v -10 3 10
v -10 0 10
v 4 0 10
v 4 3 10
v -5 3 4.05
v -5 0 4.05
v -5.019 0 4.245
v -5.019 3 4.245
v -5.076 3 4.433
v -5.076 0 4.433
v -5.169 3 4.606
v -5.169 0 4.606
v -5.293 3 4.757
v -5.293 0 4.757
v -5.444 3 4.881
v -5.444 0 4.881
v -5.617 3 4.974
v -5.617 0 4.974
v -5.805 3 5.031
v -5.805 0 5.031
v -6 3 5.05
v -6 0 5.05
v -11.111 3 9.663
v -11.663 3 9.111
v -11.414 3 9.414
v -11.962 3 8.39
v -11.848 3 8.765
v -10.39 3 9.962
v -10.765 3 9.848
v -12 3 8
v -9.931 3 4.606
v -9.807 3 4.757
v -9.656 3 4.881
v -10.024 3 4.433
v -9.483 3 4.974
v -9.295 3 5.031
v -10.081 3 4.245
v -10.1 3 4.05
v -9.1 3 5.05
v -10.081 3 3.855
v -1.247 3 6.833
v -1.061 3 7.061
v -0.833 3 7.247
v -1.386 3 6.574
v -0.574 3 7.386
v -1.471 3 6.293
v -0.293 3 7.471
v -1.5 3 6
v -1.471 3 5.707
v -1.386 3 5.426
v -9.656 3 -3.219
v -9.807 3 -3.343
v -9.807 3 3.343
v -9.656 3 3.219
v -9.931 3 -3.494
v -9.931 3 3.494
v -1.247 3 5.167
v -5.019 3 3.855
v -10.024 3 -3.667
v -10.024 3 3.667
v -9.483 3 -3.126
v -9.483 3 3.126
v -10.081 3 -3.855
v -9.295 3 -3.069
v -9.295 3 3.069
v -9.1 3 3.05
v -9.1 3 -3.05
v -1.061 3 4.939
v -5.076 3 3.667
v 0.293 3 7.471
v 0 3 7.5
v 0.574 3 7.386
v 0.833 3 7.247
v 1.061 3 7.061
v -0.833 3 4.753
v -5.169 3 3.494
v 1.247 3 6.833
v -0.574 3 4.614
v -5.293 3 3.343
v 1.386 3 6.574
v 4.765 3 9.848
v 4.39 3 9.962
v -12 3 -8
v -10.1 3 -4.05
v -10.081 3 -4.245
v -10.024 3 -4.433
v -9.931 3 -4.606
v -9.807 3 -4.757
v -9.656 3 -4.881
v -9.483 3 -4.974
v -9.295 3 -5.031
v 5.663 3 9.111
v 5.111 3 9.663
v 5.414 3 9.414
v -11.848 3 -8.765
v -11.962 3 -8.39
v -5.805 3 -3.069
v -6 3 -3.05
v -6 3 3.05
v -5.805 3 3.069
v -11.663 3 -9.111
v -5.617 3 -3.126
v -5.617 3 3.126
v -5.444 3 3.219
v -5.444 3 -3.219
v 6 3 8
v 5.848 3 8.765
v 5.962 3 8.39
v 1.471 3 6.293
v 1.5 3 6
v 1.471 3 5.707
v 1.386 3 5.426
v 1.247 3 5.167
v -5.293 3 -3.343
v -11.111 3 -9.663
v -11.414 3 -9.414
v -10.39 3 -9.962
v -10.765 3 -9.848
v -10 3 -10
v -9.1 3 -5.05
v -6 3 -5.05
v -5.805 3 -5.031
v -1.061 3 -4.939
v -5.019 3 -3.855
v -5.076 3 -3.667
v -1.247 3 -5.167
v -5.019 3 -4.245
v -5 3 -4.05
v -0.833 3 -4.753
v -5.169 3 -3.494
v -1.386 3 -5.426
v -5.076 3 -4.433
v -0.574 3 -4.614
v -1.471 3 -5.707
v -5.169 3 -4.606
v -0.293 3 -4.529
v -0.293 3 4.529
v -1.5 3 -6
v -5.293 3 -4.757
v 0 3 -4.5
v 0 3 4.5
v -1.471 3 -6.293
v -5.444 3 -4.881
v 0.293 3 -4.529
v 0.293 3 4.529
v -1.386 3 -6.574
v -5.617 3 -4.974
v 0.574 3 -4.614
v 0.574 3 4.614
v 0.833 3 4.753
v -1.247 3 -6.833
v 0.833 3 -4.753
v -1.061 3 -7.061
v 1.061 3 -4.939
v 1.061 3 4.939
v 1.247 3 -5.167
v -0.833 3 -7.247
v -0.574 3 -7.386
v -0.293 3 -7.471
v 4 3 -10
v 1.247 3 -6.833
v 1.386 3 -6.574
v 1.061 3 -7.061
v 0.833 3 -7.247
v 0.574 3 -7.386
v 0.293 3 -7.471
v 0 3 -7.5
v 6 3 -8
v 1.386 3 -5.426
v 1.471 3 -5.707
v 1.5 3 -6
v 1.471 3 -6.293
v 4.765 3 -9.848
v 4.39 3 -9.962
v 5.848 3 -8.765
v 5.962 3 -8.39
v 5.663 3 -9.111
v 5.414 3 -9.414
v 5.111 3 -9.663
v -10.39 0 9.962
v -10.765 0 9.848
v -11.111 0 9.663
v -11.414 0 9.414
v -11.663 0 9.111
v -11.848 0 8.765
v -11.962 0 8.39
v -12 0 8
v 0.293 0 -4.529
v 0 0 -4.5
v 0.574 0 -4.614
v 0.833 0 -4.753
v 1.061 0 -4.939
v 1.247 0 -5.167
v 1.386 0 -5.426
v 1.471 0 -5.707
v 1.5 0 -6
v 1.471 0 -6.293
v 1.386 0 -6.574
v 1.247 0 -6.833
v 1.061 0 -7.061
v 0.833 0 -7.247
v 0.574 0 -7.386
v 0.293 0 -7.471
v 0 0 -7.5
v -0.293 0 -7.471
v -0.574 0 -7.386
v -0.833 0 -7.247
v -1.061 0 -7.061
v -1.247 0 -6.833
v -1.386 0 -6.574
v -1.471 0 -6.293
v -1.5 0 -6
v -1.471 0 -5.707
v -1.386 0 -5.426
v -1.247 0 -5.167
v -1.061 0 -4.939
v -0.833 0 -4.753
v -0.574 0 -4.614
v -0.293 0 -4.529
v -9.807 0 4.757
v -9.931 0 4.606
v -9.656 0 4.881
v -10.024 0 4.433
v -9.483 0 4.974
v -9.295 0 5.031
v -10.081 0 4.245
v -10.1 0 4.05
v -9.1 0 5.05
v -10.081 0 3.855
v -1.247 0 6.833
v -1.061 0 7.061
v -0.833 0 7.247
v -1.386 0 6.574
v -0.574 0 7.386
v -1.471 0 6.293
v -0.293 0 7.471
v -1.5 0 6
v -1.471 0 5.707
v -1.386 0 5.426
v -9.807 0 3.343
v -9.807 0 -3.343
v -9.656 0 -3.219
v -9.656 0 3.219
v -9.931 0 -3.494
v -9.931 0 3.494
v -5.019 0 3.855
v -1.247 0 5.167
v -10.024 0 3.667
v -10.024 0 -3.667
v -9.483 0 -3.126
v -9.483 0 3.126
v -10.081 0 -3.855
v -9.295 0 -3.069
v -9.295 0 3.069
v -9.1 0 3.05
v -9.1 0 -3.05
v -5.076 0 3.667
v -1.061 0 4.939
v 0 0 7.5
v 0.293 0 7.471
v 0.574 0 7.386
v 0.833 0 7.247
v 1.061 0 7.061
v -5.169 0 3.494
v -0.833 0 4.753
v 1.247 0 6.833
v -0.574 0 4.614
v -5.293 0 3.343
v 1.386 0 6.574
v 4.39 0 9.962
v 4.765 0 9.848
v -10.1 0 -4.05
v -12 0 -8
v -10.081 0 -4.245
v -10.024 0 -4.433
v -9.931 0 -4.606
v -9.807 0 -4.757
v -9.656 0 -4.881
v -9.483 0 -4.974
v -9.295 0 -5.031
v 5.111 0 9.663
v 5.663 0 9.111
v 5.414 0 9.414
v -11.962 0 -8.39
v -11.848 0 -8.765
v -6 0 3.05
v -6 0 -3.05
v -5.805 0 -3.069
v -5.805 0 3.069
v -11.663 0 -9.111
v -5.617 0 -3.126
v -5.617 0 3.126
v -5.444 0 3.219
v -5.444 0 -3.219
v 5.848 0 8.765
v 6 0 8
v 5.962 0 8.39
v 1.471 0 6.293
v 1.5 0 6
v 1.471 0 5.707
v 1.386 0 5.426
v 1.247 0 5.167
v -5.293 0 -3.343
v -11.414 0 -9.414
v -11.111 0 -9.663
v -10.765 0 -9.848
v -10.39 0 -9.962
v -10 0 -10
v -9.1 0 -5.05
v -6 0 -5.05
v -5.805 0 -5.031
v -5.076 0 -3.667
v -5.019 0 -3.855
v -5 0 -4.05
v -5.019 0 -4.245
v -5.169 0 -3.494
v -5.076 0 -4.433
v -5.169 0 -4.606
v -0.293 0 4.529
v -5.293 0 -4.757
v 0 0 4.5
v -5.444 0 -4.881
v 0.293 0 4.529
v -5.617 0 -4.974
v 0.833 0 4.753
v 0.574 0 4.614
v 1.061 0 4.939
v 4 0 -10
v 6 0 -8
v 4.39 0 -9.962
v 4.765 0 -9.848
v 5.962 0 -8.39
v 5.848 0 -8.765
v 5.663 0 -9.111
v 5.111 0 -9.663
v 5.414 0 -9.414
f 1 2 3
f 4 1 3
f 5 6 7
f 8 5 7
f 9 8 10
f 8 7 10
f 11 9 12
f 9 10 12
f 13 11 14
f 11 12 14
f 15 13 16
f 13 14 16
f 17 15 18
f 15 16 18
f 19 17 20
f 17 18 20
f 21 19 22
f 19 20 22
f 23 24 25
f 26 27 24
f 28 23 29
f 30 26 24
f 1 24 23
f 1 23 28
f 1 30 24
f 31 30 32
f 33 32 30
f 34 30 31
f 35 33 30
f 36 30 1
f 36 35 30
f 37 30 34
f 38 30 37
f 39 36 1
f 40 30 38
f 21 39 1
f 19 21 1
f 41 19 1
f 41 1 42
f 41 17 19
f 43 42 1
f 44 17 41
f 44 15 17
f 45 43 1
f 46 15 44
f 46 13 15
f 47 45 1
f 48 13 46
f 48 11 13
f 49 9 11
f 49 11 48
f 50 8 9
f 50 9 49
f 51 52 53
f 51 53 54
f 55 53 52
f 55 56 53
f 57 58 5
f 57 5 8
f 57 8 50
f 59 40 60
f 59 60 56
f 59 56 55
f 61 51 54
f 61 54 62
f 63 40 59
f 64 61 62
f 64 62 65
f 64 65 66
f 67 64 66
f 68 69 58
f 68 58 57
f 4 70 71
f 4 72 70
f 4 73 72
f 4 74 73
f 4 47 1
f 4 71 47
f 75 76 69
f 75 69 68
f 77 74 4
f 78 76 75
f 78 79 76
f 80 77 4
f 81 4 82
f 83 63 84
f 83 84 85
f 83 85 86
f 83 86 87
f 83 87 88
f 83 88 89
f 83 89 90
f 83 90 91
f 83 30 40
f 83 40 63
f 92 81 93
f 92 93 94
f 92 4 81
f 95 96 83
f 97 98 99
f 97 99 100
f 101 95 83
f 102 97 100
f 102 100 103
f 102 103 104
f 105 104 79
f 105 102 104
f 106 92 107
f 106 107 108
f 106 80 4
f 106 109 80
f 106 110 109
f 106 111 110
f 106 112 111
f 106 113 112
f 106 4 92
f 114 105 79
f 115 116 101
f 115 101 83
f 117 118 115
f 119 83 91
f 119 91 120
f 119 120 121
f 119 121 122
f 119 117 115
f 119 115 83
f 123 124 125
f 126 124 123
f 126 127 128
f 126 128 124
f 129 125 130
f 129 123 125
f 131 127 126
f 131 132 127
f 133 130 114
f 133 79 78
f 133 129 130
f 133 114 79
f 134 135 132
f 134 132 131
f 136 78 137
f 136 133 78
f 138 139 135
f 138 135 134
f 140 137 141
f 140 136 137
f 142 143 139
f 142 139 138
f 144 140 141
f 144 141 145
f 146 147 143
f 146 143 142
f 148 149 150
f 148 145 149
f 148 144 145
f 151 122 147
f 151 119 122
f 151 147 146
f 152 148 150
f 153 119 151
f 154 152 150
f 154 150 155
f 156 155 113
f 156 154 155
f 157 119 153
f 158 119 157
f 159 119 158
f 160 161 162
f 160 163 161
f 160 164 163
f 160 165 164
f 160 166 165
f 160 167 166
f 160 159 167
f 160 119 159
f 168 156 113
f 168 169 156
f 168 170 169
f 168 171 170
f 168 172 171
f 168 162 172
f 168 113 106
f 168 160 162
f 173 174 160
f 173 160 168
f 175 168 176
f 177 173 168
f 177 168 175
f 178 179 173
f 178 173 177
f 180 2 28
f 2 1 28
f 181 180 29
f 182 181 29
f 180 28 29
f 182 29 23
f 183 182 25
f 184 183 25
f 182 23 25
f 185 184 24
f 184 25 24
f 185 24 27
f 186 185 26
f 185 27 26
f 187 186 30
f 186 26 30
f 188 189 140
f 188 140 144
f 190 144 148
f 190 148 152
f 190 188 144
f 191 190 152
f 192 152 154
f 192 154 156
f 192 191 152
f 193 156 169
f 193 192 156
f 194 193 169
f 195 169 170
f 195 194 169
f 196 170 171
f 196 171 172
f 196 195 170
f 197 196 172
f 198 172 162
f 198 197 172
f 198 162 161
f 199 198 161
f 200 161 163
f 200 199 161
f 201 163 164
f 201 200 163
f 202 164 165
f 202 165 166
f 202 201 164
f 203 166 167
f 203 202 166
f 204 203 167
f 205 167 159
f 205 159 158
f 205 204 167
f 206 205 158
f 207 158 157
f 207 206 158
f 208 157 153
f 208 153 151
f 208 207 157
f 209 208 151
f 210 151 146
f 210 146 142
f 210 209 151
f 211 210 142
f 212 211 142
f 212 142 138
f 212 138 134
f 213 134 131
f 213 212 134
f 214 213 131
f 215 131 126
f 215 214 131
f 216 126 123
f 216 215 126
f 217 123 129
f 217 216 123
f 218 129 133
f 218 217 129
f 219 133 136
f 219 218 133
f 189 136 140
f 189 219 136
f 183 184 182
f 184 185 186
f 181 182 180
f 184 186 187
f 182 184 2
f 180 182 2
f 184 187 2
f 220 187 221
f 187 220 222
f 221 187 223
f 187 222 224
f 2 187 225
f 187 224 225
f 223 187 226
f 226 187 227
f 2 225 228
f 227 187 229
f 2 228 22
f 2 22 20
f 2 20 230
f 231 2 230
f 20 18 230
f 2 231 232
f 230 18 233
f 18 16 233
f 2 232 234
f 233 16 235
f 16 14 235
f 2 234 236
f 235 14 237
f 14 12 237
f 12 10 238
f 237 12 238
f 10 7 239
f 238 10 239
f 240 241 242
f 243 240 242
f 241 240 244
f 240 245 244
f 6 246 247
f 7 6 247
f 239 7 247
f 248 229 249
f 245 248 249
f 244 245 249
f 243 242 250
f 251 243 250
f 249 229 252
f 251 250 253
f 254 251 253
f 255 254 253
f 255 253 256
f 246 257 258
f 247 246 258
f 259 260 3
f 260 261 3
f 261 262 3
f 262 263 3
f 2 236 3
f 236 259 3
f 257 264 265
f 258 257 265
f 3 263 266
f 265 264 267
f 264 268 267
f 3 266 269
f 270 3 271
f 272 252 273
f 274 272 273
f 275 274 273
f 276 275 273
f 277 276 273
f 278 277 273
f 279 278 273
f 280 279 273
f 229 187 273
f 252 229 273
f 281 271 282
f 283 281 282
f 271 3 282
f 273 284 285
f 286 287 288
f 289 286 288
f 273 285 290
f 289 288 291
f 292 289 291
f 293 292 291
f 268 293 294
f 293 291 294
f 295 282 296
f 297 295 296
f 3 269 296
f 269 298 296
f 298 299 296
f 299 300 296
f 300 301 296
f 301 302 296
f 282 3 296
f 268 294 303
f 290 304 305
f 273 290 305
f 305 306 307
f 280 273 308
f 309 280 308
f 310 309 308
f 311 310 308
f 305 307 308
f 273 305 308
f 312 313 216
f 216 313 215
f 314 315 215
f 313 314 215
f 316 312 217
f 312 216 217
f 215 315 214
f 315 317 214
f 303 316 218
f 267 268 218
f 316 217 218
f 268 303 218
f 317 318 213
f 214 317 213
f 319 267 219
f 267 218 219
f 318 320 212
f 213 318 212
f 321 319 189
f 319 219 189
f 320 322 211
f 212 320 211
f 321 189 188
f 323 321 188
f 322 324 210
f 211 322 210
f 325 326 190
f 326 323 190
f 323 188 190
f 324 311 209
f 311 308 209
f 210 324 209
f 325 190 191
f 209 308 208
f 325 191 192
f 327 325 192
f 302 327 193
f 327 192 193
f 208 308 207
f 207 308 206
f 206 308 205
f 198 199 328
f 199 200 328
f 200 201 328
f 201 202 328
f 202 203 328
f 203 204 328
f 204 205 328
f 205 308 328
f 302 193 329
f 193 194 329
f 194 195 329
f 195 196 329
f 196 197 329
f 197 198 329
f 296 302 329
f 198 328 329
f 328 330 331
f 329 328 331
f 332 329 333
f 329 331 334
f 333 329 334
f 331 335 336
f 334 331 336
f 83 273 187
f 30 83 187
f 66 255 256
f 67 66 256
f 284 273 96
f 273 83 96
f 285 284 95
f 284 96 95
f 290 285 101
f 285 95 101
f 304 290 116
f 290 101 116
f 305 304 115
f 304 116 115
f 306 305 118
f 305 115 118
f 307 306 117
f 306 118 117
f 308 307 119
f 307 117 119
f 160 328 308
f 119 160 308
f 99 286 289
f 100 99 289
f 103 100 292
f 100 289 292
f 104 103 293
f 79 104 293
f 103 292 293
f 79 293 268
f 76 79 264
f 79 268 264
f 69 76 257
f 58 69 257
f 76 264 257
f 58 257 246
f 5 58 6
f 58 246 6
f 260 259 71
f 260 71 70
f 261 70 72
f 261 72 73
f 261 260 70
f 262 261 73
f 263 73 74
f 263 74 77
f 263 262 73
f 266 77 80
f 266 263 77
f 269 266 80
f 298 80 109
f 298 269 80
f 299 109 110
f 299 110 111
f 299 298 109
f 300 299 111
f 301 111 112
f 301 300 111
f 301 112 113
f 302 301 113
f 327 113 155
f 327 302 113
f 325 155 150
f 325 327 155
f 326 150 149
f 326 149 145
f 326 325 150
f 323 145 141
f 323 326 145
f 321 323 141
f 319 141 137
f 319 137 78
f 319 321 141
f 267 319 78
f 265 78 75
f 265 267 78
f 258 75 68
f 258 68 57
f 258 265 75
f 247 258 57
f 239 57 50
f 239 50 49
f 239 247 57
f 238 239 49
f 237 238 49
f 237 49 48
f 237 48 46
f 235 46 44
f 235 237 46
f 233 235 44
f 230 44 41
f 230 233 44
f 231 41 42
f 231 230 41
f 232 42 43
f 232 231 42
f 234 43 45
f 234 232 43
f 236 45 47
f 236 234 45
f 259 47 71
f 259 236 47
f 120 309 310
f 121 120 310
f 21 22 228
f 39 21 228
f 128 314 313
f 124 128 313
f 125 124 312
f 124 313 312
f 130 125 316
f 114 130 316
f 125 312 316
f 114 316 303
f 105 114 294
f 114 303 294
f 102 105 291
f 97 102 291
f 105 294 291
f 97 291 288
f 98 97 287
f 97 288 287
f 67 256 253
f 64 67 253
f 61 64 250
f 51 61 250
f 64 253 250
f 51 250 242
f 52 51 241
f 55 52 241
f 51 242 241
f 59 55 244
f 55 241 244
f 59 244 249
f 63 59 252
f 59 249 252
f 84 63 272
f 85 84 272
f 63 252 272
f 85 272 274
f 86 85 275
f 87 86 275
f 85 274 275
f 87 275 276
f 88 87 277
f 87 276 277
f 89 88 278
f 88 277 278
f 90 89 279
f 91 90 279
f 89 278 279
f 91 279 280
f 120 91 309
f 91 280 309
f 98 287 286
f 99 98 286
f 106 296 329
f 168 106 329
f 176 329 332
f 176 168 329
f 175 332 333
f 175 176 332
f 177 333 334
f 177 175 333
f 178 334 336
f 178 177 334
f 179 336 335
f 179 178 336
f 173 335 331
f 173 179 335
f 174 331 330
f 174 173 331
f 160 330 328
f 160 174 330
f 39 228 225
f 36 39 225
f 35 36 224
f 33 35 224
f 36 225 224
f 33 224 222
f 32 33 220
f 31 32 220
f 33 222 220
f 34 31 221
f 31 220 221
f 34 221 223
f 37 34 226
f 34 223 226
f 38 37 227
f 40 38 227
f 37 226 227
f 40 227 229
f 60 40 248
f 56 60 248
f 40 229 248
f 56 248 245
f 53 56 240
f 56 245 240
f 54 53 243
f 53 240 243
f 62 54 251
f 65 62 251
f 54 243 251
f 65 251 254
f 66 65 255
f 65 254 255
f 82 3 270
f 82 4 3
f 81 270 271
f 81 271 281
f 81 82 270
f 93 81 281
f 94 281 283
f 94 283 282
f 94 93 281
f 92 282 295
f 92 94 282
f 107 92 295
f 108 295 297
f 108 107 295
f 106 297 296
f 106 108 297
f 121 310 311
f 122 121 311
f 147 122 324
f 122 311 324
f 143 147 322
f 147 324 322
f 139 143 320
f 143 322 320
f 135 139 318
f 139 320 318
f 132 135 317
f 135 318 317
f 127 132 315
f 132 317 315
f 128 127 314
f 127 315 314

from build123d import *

# Parameters (mm, degrees)
SKETCH_1_R      = 1.5
EXTRUDE_1_DEPTH = 3
FILLET_1_R      = 2


with BuildPart() as part:
    # 草图1 → 凸台-拉伸1 (new body)
    with BuildSketch(Plane(origin=(0, 0, 0), x_dir=(1, 0, 0), z_dir=(0, 1, 0))):
        Polygon((-12, -10), (-6, -10), (6, -10), (6, 10), (-6, 10), (-12, 10), align=None)
        with Locations(Location((0, -6, 0), (0, 0, 270))):
            Circle(SKETCH_1_R, mode=Mode.SUBTRACT)
        with BuildLine():
            Line((-6, -5.05), (-9.1, -5.05))
            ThreePointArc((-9.1, -5.05), (-10.1, -4.05), (-9.1, -3.05))
            Line((-9.1, -3.05), (-9.1, 3.05))
            ThreePointArc((-9.1, 3.05), (-10.1, 4.05), (-9.1, 5.05))
            Line((-9.1, 5.05), (-6, 5.05))
            ThreePointArc((-6, 5.05), (-5.292893219, 4.757106781), (-5, 4.05))
            ThreePointArc((-5, 4.05), (-5.292893219, 3.342893219), (-6, 3.05))
            Line((-6, 3.05), (-6, -3.05))
            ThreePointArc((-6, -3.05), (-5.292893219, -3.342893219), (-5, -4.05))
            ThreePointArc((-5, -4.05), (-5.292893219, -4.757106781), (-6, -5.05))
        make_face(mode=Mode.SUBTRACT)
        with Locations(Location((0, 6, 0), (0, 0, 270))):
            Circle(SKETCH_1_R, mode=Mode.SUBTRACT)
    extrude(amount=EXTRUDE_1_DEPTH)

    # 圆角1
    fillet_1_edges = [part.edges().sort_by_distance(p)[0] for p in [
        (6, 1.5, -10),
        (6, 1.5, 10),
        (-12, 1.5, 10),
        (-12, 1.5, -10),
    ]]
    fillet(fillet_1_edges, radius=FILLET_1_R)


solid = part.part
